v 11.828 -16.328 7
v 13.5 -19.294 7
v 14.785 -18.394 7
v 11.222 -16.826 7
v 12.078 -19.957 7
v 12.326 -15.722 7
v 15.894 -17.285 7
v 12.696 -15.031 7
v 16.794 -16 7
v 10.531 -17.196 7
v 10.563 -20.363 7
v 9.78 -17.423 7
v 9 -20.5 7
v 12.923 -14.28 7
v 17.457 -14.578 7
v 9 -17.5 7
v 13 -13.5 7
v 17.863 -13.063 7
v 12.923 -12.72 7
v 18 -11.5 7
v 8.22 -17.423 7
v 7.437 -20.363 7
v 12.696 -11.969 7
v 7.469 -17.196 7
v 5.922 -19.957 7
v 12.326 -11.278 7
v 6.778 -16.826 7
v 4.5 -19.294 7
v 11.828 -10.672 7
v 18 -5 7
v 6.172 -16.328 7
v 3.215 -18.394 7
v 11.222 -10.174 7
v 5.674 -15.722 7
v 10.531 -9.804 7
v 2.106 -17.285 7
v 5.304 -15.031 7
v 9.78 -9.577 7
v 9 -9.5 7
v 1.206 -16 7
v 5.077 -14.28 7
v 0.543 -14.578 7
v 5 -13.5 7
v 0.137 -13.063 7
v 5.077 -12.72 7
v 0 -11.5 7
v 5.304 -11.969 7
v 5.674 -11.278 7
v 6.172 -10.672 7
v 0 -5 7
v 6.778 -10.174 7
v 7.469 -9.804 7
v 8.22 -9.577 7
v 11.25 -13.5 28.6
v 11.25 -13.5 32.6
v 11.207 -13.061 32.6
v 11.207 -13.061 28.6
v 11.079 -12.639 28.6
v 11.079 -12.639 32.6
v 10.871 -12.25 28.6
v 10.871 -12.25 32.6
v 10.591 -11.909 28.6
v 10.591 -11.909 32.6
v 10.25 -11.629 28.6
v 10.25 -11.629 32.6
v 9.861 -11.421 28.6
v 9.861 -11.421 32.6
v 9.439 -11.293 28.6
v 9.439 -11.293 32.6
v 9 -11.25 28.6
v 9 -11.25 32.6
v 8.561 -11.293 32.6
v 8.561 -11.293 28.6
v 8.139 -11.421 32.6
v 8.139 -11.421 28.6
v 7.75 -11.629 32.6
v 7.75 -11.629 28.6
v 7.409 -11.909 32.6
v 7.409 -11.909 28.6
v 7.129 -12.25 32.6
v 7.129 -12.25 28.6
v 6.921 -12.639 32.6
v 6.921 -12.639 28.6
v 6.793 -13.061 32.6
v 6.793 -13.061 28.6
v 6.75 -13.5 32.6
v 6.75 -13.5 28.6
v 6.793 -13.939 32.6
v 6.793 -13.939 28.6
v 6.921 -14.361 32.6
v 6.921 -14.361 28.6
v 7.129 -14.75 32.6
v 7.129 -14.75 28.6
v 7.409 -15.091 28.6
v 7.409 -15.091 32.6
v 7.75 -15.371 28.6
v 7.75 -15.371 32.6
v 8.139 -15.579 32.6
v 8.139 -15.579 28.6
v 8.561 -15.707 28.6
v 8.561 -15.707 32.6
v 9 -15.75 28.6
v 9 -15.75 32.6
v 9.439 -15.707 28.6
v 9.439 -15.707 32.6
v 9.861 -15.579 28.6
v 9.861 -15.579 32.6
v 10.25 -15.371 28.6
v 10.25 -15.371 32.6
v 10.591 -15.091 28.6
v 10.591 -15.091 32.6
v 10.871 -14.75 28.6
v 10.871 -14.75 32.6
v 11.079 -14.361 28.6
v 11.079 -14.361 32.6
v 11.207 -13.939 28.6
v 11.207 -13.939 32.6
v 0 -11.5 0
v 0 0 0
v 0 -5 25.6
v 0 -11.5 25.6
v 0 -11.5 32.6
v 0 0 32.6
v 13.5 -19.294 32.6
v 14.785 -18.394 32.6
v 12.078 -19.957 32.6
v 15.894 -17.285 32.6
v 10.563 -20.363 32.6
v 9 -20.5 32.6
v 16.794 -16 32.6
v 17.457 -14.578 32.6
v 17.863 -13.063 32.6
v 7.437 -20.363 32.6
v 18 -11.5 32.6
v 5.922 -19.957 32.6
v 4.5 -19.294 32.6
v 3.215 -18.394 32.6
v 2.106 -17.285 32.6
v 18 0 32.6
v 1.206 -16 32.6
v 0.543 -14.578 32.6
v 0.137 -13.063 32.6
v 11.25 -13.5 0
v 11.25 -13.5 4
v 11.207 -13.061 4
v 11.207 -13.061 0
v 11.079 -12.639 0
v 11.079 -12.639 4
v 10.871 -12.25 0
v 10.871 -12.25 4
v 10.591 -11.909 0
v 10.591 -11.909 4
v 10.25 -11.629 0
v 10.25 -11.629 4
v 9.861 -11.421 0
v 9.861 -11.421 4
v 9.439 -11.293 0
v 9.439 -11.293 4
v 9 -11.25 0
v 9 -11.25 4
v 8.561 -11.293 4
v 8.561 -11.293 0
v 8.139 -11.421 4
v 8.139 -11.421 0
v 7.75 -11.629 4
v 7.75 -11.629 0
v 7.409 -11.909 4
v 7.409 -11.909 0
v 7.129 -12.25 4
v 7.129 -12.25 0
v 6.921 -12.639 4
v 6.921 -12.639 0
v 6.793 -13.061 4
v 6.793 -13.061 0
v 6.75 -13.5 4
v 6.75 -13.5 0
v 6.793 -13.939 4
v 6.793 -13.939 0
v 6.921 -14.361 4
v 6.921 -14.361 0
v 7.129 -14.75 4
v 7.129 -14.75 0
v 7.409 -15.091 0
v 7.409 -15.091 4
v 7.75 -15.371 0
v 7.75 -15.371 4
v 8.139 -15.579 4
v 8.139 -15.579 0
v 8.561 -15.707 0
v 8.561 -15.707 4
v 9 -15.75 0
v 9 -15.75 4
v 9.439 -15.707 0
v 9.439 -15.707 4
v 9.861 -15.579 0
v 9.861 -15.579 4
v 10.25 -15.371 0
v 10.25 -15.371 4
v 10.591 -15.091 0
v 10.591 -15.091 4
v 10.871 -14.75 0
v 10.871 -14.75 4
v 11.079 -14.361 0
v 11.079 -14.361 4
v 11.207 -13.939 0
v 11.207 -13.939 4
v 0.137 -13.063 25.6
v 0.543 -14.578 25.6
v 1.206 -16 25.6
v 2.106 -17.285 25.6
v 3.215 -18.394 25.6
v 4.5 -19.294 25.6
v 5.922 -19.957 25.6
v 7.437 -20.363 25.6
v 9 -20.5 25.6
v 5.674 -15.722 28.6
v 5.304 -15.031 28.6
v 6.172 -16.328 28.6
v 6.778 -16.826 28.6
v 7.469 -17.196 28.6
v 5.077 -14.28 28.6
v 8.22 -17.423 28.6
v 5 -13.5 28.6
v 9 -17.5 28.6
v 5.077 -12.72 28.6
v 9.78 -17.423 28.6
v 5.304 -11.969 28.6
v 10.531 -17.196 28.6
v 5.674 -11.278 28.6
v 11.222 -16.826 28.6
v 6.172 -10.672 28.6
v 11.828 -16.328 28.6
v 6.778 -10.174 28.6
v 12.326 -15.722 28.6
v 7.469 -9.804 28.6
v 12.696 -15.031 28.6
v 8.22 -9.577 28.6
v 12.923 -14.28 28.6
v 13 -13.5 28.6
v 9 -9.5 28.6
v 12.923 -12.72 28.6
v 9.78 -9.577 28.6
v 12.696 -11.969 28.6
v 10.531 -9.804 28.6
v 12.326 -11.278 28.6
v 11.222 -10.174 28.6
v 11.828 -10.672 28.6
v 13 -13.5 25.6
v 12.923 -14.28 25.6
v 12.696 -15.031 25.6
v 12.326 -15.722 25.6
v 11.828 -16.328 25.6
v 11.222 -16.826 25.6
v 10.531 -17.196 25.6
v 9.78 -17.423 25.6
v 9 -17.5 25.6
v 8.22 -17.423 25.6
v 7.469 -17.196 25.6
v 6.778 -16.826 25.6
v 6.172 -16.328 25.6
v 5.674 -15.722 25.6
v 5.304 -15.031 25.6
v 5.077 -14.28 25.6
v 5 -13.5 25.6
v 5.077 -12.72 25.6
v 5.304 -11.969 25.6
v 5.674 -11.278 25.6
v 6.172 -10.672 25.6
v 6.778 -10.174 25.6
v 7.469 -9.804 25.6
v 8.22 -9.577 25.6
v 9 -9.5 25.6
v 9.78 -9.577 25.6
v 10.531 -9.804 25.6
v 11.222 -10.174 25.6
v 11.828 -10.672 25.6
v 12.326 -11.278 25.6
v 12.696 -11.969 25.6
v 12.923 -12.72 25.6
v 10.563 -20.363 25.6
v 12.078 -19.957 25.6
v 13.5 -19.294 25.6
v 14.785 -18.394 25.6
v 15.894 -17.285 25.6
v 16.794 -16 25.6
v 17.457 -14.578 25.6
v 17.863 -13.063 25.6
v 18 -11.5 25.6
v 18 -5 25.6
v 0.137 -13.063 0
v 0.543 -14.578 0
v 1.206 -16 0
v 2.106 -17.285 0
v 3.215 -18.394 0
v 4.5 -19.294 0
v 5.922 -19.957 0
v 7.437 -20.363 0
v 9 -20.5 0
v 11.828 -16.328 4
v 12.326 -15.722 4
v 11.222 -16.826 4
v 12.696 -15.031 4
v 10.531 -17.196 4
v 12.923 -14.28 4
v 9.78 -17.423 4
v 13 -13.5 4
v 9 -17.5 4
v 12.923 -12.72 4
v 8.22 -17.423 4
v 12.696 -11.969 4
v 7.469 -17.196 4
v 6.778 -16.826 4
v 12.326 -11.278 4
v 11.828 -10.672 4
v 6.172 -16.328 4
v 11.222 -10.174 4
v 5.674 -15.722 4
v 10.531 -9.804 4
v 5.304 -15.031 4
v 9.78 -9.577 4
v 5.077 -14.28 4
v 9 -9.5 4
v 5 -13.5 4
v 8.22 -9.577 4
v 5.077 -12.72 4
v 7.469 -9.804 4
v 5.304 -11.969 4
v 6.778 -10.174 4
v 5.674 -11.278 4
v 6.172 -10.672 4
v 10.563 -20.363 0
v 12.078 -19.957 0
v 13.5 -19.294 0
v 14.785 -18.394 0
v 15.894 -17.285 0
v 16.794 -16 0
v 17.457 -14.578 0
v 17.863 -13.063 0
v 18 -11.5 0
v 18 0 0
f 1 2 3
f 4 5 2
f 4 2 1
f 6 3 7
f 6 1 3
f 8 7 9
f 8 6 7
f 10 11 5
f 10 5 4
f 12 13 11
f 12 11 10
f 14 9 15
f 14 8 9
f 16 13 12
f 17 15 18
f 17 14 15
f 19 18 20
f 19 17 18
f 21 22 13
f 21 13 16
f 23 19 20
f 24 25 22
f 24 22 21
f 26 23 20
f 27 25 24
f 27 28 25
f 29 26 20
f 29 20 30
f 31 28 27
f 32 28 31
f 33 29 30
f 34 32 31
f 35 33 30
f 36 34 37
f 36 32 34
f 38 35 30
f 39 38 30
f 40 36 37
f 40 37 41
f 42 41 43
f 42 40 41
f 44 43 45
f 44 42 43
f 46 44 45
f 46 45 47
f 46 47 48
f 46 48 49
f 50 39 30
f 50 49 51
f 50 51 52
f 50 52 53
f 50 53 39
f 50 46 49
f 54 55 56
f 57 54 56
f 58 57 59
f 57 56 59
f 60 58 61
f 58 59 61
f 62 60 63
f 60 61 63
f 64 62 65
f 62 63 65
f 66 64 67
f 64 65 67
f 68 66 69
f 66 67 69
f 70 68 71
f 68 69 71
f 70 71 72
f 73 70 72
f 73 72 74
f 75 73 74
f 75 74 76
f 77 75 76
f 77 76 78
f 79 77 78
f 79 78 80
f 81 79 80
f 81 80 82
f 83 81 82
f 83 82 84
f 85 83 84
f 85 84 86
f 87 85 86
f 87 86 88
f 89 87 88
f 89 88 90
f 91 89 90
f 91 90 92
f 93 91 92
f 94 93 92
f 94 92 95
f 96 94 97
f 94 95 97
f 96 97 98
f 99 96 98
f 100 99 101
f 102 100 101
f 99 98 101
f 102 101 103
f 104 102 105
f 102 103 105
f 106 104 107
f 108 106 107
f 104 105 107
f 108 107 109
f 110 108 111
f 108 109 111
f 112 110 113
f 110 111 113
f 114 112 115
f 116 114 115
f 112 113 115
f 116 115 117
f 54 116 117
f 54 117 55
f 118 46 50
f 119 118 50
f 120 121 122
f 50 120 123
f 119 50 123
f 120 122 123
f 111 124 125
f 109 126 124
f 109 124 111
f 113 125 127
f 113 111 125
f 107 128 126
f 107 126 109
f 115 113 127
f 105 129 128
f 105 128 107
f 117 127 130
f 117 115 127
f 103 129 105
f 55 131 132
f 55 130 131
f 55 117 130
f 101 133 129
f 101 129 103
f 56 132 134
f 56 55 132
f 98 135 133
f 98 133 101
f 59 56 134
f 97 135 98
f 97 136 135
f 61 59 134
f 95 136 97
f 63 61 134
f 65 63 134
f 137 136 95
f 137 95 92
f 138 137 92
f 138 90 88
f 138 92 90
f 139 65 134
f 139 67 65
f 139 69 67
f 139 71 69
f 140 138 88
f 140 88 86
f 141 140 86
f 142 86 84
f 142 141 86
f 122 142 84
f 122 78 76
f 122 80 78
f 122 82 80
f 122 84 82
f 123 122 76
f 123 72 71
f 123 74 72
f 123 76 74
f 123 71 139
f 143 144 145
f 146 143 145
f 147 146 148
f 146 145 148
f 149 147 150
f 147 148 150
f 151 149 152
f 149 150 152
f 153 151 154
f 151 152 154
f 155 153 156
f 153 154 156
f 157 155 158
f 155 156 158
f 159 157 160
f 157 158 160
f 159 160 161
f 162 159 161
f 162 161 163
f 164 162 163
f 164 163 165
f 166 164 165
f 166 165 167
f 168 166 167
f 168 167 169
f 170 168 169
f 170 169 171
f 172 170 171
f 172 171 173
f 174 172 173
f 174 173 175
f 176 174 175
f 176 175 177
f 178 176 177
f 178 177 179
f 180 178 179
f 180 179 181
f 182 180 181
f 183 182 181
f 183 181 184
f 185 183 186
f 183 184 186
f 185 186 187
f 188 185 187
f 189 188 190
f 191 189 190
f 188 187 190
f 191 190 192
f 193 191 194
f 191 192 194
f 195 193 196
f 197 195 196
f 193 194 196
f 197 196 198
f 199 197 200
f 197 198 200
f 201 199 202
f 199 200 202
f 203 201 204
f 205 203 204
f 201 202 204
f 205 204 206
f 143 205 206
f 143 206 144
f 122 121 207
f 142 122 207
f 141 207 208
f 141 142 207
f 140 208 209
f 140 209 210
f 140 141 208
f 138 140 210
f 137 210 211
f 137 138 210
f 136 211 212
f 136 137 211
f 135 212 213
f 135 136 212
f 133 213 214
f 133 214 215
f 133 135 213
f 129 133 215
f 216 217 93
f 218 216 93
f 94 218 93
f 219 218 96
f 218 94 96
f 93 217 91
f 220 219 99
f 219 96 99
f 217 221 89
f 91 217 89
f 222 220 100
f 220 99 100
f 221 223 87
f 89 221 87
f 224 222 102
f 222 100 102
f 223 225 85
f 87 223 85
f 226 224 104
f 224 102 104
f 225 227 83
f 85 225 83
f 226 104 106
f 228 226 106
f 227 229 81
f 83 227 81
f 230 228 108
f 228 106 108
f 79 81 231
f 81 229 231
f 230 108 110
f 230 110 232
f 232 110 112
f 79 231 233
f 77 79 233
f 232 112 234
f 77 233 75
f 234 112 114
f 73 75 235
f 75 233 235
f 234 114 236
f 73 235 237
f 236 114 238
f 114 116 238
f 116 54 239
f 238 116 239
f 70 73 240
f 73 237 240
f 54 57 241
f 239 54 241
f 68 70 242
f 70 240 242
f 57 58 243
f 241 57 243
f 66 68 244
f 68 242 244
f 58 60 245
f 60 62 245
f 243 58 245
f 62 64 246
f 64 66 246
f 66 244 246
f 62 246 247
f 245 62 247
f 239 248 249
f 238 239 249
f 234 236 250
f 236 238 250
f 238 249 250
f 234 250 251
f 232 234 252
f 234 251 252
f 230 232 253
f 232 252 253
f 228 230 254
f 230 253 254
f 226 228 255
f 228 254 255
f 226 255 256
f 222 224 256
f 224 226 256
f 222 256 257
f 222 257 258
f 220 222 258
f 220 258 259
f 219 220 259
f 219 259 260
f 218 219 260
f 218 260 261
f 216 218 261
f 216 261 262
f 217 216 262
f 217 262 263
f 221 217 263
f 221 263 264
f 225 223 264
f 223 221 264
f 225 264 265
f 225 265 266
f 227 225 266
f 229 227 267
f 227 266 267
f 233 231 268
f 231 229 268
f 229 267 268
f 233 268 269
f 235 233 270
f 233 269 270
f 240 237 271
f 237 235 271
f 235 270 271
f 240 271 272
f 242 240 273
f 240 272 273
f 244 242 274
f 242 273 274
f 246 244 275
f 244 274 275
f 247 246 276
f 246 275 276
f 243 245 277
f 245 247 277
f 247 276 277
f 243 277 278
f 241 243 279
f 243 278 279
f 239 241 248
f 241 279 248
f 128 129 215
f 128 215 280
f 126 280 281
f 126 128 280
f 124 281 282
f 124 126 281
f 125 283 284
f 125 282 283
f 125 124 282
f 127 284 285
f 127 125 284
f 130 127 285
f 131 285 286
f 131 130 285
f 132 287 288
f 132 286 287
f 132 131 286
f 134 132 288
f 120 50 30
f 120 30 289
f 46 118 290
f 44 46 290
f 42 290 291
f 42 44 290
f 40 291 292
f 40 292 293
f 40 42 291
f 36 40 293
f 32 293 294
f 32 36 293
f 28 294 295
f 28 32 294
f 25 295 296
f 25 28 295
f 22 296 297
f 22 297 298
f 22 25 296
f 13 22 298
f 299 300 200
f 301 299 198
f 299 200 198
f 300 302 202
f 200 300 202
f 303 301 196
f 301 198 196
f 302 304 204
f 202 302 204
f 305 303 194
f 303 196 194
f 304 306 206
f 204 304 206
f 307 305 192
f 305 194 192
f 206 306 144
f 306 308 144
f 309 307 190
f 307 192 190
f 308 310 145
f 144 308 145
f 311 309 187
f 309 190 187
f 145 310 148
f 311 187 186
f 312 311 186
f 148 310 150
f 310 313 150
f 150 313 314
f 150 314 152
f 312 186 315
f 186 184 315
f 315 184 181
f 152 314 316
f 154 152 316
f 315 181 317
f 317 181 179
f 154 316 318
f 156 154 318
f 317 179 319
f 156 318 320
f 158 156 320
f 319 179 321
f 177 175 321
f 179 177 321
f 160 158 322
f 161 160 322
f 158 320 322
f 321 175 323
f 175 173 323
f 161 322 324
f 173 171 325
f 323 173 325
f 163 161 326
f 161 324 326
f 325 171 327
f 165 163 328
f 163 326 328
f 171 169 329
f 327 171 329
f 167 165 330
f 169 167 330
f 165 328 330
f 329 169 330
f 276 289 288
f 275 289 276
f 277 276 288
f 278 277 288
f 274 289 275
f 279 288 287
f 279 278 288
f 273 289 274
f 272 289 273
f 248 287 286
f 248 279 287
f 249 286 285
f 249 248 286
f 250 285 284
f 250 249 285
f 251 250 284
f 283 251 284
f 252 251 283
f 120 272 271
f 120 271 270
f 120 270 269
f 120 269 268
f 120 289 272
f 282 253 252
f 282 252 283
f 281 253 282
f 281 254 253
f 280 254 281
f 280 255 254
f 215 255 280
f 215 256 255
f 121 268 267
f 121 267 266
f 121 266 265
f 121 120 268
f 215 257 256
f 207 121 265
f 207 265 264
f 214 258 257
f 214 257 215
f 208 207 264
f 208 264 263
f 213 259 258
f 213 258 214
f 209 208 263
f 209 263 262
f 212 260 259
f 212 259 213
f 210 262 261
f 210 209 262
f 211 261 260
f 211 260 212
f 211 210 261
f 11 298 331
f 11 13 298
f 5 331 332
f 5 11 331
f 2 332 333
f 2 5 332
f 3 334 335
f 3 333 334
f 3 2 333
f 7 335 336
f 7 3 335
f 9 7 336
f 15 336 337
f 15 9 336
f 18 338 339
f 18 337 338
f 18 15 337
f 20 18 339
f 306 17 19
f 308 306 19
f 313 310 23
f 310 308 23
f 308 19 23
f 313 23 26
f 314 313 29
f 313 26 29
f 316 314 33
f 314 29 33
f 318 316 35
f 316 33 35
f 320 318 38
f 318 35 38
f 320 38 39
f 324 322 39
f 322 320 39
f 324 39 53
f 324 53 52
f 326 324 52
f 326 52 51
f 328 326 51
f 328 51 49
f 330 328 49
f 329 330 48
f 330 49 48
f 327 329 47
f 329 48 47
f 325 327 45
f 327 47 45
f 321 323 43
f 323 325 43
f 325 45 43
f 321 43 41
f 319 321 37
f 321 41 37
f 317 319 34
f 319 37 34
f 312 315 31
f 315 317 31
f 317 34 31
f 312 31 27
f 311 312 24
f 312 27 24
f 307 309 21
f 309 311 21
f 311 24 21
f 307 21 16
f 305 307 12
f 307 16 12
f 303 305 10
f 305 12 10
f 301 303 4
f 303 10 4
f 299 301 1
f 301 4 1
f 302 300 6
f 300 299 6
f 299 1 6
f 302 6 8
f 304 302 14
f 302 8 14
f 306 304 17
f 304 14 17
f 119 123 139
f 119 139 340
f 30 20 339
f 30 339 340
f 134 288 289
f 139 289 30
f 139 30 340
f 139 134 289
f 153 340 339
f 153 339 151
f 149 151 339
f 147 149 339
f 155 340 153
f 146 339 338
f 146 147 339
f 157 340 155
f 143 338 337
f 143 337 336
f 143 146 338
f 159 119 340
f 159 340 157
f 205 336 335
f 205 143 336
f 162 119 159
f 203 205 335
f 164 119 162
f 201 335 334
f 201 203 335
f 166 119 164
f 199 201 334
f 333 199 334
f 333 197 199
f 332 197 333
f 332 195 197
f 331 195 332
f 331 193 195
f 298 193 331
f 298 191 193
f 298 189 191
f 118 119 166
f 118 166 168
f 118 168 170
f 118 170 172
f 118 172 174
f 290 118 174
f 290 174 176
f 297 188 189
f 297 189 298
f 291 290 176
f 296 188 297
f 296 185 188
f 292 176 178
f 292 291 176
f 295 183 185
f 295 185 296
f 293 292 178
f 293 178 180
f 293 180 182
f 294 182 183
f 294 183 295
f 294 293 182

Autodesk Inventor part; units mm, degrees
ref_plane "YZ Plane" through (0, 0, 0) normal (1, 0, 0) x (0, 1, 0)
ref_plane "XZ Plane" through (0, 0, 0) normal (0, 1, 0) x (-1, 0, 0)
sketch "Эскиз2" plane through (0, 0, 0) normal (1, 0, 0) x (0, 1, 0)
  line L0 (0, 0) -> (-20.5, 0)
  line L1 (-20.5, 0) -> (-20.5, 32.6)
  line L2 (-20.5, 32.6) -> (0, 32.6)
  line L3 (0, 32.6) -> (0, 0)
  line L4 (-20.5, 0) -> (-20.5, 7)
  line L5 (-20.5, 7) -> (-5, 7)
  line L6 (-5, 7) -> (-5, 25.6)
  line L7 (-5, 25.6) -> (-20.5, 25.6)
  line L8 (-20.5, 25.6) -> (-20.5, 7)
  point P0 (0, 3)
  dimension "d0" = 20.5
  dimension "d1" = 32.6
  dimension "d2" = 7
  dimension "d3" = 15.5
  dimension "d4" = 18.6
extrude "Выдавливание1" add sketch "Эскиз2" along normal blind 18 contours L0 L1 L5 L6 L7 L2 L3
sketch "Эскиз4" plane through (0, -20.5, 32.6) normal (0, 0, 1) x (1, 0, 0)
  line L0 (0, 0) -> (18, 0) projected
  line L1 (9, 0) -> (9, 7)
  circle A0 centre (9, 7) radius 4
  point P0 (0, 20.5)
  dimension "d7" = 7
  dimension "d8" = 8
extrude "Выдавливание2" cut sketch "Эскиз4" along normal blind 3 from surface at -7
ref_plane "РабПлоскость1" through (18, -5, 16.3) normal (0, 0, -1) x (-1, 0, 0)
mirror "Зеркальное отражение1" about plane through (18, -5, 16.3) normal (0, 0, -1) of "Выдавливание2"
sketch "Эскиз6" plane through (0, -20.5, 32.6) normal (0, 0, 1) x (1, 0, 0)
  circle A0 centre (9, 7) radius 4 projected
  circle A1 centre (9, 7) radius 2.25
  point P0 (0, 20.5)
  dimension "d11" = 4.5
extrude "Выдавливание3" cut sketch "Эскиз6" against normal through all contours A1
fillet "Сопряжение1" radius 9 4 edges at (18, -20.5, 29.1) (0, -20.5, 29.1) (18, -20.5, 3.5) (0, -20.5, 3.5)
equation "\"d2\" = -0.5 * d4 + 0.5 * d1"
properties part number "Крепление кулака"
